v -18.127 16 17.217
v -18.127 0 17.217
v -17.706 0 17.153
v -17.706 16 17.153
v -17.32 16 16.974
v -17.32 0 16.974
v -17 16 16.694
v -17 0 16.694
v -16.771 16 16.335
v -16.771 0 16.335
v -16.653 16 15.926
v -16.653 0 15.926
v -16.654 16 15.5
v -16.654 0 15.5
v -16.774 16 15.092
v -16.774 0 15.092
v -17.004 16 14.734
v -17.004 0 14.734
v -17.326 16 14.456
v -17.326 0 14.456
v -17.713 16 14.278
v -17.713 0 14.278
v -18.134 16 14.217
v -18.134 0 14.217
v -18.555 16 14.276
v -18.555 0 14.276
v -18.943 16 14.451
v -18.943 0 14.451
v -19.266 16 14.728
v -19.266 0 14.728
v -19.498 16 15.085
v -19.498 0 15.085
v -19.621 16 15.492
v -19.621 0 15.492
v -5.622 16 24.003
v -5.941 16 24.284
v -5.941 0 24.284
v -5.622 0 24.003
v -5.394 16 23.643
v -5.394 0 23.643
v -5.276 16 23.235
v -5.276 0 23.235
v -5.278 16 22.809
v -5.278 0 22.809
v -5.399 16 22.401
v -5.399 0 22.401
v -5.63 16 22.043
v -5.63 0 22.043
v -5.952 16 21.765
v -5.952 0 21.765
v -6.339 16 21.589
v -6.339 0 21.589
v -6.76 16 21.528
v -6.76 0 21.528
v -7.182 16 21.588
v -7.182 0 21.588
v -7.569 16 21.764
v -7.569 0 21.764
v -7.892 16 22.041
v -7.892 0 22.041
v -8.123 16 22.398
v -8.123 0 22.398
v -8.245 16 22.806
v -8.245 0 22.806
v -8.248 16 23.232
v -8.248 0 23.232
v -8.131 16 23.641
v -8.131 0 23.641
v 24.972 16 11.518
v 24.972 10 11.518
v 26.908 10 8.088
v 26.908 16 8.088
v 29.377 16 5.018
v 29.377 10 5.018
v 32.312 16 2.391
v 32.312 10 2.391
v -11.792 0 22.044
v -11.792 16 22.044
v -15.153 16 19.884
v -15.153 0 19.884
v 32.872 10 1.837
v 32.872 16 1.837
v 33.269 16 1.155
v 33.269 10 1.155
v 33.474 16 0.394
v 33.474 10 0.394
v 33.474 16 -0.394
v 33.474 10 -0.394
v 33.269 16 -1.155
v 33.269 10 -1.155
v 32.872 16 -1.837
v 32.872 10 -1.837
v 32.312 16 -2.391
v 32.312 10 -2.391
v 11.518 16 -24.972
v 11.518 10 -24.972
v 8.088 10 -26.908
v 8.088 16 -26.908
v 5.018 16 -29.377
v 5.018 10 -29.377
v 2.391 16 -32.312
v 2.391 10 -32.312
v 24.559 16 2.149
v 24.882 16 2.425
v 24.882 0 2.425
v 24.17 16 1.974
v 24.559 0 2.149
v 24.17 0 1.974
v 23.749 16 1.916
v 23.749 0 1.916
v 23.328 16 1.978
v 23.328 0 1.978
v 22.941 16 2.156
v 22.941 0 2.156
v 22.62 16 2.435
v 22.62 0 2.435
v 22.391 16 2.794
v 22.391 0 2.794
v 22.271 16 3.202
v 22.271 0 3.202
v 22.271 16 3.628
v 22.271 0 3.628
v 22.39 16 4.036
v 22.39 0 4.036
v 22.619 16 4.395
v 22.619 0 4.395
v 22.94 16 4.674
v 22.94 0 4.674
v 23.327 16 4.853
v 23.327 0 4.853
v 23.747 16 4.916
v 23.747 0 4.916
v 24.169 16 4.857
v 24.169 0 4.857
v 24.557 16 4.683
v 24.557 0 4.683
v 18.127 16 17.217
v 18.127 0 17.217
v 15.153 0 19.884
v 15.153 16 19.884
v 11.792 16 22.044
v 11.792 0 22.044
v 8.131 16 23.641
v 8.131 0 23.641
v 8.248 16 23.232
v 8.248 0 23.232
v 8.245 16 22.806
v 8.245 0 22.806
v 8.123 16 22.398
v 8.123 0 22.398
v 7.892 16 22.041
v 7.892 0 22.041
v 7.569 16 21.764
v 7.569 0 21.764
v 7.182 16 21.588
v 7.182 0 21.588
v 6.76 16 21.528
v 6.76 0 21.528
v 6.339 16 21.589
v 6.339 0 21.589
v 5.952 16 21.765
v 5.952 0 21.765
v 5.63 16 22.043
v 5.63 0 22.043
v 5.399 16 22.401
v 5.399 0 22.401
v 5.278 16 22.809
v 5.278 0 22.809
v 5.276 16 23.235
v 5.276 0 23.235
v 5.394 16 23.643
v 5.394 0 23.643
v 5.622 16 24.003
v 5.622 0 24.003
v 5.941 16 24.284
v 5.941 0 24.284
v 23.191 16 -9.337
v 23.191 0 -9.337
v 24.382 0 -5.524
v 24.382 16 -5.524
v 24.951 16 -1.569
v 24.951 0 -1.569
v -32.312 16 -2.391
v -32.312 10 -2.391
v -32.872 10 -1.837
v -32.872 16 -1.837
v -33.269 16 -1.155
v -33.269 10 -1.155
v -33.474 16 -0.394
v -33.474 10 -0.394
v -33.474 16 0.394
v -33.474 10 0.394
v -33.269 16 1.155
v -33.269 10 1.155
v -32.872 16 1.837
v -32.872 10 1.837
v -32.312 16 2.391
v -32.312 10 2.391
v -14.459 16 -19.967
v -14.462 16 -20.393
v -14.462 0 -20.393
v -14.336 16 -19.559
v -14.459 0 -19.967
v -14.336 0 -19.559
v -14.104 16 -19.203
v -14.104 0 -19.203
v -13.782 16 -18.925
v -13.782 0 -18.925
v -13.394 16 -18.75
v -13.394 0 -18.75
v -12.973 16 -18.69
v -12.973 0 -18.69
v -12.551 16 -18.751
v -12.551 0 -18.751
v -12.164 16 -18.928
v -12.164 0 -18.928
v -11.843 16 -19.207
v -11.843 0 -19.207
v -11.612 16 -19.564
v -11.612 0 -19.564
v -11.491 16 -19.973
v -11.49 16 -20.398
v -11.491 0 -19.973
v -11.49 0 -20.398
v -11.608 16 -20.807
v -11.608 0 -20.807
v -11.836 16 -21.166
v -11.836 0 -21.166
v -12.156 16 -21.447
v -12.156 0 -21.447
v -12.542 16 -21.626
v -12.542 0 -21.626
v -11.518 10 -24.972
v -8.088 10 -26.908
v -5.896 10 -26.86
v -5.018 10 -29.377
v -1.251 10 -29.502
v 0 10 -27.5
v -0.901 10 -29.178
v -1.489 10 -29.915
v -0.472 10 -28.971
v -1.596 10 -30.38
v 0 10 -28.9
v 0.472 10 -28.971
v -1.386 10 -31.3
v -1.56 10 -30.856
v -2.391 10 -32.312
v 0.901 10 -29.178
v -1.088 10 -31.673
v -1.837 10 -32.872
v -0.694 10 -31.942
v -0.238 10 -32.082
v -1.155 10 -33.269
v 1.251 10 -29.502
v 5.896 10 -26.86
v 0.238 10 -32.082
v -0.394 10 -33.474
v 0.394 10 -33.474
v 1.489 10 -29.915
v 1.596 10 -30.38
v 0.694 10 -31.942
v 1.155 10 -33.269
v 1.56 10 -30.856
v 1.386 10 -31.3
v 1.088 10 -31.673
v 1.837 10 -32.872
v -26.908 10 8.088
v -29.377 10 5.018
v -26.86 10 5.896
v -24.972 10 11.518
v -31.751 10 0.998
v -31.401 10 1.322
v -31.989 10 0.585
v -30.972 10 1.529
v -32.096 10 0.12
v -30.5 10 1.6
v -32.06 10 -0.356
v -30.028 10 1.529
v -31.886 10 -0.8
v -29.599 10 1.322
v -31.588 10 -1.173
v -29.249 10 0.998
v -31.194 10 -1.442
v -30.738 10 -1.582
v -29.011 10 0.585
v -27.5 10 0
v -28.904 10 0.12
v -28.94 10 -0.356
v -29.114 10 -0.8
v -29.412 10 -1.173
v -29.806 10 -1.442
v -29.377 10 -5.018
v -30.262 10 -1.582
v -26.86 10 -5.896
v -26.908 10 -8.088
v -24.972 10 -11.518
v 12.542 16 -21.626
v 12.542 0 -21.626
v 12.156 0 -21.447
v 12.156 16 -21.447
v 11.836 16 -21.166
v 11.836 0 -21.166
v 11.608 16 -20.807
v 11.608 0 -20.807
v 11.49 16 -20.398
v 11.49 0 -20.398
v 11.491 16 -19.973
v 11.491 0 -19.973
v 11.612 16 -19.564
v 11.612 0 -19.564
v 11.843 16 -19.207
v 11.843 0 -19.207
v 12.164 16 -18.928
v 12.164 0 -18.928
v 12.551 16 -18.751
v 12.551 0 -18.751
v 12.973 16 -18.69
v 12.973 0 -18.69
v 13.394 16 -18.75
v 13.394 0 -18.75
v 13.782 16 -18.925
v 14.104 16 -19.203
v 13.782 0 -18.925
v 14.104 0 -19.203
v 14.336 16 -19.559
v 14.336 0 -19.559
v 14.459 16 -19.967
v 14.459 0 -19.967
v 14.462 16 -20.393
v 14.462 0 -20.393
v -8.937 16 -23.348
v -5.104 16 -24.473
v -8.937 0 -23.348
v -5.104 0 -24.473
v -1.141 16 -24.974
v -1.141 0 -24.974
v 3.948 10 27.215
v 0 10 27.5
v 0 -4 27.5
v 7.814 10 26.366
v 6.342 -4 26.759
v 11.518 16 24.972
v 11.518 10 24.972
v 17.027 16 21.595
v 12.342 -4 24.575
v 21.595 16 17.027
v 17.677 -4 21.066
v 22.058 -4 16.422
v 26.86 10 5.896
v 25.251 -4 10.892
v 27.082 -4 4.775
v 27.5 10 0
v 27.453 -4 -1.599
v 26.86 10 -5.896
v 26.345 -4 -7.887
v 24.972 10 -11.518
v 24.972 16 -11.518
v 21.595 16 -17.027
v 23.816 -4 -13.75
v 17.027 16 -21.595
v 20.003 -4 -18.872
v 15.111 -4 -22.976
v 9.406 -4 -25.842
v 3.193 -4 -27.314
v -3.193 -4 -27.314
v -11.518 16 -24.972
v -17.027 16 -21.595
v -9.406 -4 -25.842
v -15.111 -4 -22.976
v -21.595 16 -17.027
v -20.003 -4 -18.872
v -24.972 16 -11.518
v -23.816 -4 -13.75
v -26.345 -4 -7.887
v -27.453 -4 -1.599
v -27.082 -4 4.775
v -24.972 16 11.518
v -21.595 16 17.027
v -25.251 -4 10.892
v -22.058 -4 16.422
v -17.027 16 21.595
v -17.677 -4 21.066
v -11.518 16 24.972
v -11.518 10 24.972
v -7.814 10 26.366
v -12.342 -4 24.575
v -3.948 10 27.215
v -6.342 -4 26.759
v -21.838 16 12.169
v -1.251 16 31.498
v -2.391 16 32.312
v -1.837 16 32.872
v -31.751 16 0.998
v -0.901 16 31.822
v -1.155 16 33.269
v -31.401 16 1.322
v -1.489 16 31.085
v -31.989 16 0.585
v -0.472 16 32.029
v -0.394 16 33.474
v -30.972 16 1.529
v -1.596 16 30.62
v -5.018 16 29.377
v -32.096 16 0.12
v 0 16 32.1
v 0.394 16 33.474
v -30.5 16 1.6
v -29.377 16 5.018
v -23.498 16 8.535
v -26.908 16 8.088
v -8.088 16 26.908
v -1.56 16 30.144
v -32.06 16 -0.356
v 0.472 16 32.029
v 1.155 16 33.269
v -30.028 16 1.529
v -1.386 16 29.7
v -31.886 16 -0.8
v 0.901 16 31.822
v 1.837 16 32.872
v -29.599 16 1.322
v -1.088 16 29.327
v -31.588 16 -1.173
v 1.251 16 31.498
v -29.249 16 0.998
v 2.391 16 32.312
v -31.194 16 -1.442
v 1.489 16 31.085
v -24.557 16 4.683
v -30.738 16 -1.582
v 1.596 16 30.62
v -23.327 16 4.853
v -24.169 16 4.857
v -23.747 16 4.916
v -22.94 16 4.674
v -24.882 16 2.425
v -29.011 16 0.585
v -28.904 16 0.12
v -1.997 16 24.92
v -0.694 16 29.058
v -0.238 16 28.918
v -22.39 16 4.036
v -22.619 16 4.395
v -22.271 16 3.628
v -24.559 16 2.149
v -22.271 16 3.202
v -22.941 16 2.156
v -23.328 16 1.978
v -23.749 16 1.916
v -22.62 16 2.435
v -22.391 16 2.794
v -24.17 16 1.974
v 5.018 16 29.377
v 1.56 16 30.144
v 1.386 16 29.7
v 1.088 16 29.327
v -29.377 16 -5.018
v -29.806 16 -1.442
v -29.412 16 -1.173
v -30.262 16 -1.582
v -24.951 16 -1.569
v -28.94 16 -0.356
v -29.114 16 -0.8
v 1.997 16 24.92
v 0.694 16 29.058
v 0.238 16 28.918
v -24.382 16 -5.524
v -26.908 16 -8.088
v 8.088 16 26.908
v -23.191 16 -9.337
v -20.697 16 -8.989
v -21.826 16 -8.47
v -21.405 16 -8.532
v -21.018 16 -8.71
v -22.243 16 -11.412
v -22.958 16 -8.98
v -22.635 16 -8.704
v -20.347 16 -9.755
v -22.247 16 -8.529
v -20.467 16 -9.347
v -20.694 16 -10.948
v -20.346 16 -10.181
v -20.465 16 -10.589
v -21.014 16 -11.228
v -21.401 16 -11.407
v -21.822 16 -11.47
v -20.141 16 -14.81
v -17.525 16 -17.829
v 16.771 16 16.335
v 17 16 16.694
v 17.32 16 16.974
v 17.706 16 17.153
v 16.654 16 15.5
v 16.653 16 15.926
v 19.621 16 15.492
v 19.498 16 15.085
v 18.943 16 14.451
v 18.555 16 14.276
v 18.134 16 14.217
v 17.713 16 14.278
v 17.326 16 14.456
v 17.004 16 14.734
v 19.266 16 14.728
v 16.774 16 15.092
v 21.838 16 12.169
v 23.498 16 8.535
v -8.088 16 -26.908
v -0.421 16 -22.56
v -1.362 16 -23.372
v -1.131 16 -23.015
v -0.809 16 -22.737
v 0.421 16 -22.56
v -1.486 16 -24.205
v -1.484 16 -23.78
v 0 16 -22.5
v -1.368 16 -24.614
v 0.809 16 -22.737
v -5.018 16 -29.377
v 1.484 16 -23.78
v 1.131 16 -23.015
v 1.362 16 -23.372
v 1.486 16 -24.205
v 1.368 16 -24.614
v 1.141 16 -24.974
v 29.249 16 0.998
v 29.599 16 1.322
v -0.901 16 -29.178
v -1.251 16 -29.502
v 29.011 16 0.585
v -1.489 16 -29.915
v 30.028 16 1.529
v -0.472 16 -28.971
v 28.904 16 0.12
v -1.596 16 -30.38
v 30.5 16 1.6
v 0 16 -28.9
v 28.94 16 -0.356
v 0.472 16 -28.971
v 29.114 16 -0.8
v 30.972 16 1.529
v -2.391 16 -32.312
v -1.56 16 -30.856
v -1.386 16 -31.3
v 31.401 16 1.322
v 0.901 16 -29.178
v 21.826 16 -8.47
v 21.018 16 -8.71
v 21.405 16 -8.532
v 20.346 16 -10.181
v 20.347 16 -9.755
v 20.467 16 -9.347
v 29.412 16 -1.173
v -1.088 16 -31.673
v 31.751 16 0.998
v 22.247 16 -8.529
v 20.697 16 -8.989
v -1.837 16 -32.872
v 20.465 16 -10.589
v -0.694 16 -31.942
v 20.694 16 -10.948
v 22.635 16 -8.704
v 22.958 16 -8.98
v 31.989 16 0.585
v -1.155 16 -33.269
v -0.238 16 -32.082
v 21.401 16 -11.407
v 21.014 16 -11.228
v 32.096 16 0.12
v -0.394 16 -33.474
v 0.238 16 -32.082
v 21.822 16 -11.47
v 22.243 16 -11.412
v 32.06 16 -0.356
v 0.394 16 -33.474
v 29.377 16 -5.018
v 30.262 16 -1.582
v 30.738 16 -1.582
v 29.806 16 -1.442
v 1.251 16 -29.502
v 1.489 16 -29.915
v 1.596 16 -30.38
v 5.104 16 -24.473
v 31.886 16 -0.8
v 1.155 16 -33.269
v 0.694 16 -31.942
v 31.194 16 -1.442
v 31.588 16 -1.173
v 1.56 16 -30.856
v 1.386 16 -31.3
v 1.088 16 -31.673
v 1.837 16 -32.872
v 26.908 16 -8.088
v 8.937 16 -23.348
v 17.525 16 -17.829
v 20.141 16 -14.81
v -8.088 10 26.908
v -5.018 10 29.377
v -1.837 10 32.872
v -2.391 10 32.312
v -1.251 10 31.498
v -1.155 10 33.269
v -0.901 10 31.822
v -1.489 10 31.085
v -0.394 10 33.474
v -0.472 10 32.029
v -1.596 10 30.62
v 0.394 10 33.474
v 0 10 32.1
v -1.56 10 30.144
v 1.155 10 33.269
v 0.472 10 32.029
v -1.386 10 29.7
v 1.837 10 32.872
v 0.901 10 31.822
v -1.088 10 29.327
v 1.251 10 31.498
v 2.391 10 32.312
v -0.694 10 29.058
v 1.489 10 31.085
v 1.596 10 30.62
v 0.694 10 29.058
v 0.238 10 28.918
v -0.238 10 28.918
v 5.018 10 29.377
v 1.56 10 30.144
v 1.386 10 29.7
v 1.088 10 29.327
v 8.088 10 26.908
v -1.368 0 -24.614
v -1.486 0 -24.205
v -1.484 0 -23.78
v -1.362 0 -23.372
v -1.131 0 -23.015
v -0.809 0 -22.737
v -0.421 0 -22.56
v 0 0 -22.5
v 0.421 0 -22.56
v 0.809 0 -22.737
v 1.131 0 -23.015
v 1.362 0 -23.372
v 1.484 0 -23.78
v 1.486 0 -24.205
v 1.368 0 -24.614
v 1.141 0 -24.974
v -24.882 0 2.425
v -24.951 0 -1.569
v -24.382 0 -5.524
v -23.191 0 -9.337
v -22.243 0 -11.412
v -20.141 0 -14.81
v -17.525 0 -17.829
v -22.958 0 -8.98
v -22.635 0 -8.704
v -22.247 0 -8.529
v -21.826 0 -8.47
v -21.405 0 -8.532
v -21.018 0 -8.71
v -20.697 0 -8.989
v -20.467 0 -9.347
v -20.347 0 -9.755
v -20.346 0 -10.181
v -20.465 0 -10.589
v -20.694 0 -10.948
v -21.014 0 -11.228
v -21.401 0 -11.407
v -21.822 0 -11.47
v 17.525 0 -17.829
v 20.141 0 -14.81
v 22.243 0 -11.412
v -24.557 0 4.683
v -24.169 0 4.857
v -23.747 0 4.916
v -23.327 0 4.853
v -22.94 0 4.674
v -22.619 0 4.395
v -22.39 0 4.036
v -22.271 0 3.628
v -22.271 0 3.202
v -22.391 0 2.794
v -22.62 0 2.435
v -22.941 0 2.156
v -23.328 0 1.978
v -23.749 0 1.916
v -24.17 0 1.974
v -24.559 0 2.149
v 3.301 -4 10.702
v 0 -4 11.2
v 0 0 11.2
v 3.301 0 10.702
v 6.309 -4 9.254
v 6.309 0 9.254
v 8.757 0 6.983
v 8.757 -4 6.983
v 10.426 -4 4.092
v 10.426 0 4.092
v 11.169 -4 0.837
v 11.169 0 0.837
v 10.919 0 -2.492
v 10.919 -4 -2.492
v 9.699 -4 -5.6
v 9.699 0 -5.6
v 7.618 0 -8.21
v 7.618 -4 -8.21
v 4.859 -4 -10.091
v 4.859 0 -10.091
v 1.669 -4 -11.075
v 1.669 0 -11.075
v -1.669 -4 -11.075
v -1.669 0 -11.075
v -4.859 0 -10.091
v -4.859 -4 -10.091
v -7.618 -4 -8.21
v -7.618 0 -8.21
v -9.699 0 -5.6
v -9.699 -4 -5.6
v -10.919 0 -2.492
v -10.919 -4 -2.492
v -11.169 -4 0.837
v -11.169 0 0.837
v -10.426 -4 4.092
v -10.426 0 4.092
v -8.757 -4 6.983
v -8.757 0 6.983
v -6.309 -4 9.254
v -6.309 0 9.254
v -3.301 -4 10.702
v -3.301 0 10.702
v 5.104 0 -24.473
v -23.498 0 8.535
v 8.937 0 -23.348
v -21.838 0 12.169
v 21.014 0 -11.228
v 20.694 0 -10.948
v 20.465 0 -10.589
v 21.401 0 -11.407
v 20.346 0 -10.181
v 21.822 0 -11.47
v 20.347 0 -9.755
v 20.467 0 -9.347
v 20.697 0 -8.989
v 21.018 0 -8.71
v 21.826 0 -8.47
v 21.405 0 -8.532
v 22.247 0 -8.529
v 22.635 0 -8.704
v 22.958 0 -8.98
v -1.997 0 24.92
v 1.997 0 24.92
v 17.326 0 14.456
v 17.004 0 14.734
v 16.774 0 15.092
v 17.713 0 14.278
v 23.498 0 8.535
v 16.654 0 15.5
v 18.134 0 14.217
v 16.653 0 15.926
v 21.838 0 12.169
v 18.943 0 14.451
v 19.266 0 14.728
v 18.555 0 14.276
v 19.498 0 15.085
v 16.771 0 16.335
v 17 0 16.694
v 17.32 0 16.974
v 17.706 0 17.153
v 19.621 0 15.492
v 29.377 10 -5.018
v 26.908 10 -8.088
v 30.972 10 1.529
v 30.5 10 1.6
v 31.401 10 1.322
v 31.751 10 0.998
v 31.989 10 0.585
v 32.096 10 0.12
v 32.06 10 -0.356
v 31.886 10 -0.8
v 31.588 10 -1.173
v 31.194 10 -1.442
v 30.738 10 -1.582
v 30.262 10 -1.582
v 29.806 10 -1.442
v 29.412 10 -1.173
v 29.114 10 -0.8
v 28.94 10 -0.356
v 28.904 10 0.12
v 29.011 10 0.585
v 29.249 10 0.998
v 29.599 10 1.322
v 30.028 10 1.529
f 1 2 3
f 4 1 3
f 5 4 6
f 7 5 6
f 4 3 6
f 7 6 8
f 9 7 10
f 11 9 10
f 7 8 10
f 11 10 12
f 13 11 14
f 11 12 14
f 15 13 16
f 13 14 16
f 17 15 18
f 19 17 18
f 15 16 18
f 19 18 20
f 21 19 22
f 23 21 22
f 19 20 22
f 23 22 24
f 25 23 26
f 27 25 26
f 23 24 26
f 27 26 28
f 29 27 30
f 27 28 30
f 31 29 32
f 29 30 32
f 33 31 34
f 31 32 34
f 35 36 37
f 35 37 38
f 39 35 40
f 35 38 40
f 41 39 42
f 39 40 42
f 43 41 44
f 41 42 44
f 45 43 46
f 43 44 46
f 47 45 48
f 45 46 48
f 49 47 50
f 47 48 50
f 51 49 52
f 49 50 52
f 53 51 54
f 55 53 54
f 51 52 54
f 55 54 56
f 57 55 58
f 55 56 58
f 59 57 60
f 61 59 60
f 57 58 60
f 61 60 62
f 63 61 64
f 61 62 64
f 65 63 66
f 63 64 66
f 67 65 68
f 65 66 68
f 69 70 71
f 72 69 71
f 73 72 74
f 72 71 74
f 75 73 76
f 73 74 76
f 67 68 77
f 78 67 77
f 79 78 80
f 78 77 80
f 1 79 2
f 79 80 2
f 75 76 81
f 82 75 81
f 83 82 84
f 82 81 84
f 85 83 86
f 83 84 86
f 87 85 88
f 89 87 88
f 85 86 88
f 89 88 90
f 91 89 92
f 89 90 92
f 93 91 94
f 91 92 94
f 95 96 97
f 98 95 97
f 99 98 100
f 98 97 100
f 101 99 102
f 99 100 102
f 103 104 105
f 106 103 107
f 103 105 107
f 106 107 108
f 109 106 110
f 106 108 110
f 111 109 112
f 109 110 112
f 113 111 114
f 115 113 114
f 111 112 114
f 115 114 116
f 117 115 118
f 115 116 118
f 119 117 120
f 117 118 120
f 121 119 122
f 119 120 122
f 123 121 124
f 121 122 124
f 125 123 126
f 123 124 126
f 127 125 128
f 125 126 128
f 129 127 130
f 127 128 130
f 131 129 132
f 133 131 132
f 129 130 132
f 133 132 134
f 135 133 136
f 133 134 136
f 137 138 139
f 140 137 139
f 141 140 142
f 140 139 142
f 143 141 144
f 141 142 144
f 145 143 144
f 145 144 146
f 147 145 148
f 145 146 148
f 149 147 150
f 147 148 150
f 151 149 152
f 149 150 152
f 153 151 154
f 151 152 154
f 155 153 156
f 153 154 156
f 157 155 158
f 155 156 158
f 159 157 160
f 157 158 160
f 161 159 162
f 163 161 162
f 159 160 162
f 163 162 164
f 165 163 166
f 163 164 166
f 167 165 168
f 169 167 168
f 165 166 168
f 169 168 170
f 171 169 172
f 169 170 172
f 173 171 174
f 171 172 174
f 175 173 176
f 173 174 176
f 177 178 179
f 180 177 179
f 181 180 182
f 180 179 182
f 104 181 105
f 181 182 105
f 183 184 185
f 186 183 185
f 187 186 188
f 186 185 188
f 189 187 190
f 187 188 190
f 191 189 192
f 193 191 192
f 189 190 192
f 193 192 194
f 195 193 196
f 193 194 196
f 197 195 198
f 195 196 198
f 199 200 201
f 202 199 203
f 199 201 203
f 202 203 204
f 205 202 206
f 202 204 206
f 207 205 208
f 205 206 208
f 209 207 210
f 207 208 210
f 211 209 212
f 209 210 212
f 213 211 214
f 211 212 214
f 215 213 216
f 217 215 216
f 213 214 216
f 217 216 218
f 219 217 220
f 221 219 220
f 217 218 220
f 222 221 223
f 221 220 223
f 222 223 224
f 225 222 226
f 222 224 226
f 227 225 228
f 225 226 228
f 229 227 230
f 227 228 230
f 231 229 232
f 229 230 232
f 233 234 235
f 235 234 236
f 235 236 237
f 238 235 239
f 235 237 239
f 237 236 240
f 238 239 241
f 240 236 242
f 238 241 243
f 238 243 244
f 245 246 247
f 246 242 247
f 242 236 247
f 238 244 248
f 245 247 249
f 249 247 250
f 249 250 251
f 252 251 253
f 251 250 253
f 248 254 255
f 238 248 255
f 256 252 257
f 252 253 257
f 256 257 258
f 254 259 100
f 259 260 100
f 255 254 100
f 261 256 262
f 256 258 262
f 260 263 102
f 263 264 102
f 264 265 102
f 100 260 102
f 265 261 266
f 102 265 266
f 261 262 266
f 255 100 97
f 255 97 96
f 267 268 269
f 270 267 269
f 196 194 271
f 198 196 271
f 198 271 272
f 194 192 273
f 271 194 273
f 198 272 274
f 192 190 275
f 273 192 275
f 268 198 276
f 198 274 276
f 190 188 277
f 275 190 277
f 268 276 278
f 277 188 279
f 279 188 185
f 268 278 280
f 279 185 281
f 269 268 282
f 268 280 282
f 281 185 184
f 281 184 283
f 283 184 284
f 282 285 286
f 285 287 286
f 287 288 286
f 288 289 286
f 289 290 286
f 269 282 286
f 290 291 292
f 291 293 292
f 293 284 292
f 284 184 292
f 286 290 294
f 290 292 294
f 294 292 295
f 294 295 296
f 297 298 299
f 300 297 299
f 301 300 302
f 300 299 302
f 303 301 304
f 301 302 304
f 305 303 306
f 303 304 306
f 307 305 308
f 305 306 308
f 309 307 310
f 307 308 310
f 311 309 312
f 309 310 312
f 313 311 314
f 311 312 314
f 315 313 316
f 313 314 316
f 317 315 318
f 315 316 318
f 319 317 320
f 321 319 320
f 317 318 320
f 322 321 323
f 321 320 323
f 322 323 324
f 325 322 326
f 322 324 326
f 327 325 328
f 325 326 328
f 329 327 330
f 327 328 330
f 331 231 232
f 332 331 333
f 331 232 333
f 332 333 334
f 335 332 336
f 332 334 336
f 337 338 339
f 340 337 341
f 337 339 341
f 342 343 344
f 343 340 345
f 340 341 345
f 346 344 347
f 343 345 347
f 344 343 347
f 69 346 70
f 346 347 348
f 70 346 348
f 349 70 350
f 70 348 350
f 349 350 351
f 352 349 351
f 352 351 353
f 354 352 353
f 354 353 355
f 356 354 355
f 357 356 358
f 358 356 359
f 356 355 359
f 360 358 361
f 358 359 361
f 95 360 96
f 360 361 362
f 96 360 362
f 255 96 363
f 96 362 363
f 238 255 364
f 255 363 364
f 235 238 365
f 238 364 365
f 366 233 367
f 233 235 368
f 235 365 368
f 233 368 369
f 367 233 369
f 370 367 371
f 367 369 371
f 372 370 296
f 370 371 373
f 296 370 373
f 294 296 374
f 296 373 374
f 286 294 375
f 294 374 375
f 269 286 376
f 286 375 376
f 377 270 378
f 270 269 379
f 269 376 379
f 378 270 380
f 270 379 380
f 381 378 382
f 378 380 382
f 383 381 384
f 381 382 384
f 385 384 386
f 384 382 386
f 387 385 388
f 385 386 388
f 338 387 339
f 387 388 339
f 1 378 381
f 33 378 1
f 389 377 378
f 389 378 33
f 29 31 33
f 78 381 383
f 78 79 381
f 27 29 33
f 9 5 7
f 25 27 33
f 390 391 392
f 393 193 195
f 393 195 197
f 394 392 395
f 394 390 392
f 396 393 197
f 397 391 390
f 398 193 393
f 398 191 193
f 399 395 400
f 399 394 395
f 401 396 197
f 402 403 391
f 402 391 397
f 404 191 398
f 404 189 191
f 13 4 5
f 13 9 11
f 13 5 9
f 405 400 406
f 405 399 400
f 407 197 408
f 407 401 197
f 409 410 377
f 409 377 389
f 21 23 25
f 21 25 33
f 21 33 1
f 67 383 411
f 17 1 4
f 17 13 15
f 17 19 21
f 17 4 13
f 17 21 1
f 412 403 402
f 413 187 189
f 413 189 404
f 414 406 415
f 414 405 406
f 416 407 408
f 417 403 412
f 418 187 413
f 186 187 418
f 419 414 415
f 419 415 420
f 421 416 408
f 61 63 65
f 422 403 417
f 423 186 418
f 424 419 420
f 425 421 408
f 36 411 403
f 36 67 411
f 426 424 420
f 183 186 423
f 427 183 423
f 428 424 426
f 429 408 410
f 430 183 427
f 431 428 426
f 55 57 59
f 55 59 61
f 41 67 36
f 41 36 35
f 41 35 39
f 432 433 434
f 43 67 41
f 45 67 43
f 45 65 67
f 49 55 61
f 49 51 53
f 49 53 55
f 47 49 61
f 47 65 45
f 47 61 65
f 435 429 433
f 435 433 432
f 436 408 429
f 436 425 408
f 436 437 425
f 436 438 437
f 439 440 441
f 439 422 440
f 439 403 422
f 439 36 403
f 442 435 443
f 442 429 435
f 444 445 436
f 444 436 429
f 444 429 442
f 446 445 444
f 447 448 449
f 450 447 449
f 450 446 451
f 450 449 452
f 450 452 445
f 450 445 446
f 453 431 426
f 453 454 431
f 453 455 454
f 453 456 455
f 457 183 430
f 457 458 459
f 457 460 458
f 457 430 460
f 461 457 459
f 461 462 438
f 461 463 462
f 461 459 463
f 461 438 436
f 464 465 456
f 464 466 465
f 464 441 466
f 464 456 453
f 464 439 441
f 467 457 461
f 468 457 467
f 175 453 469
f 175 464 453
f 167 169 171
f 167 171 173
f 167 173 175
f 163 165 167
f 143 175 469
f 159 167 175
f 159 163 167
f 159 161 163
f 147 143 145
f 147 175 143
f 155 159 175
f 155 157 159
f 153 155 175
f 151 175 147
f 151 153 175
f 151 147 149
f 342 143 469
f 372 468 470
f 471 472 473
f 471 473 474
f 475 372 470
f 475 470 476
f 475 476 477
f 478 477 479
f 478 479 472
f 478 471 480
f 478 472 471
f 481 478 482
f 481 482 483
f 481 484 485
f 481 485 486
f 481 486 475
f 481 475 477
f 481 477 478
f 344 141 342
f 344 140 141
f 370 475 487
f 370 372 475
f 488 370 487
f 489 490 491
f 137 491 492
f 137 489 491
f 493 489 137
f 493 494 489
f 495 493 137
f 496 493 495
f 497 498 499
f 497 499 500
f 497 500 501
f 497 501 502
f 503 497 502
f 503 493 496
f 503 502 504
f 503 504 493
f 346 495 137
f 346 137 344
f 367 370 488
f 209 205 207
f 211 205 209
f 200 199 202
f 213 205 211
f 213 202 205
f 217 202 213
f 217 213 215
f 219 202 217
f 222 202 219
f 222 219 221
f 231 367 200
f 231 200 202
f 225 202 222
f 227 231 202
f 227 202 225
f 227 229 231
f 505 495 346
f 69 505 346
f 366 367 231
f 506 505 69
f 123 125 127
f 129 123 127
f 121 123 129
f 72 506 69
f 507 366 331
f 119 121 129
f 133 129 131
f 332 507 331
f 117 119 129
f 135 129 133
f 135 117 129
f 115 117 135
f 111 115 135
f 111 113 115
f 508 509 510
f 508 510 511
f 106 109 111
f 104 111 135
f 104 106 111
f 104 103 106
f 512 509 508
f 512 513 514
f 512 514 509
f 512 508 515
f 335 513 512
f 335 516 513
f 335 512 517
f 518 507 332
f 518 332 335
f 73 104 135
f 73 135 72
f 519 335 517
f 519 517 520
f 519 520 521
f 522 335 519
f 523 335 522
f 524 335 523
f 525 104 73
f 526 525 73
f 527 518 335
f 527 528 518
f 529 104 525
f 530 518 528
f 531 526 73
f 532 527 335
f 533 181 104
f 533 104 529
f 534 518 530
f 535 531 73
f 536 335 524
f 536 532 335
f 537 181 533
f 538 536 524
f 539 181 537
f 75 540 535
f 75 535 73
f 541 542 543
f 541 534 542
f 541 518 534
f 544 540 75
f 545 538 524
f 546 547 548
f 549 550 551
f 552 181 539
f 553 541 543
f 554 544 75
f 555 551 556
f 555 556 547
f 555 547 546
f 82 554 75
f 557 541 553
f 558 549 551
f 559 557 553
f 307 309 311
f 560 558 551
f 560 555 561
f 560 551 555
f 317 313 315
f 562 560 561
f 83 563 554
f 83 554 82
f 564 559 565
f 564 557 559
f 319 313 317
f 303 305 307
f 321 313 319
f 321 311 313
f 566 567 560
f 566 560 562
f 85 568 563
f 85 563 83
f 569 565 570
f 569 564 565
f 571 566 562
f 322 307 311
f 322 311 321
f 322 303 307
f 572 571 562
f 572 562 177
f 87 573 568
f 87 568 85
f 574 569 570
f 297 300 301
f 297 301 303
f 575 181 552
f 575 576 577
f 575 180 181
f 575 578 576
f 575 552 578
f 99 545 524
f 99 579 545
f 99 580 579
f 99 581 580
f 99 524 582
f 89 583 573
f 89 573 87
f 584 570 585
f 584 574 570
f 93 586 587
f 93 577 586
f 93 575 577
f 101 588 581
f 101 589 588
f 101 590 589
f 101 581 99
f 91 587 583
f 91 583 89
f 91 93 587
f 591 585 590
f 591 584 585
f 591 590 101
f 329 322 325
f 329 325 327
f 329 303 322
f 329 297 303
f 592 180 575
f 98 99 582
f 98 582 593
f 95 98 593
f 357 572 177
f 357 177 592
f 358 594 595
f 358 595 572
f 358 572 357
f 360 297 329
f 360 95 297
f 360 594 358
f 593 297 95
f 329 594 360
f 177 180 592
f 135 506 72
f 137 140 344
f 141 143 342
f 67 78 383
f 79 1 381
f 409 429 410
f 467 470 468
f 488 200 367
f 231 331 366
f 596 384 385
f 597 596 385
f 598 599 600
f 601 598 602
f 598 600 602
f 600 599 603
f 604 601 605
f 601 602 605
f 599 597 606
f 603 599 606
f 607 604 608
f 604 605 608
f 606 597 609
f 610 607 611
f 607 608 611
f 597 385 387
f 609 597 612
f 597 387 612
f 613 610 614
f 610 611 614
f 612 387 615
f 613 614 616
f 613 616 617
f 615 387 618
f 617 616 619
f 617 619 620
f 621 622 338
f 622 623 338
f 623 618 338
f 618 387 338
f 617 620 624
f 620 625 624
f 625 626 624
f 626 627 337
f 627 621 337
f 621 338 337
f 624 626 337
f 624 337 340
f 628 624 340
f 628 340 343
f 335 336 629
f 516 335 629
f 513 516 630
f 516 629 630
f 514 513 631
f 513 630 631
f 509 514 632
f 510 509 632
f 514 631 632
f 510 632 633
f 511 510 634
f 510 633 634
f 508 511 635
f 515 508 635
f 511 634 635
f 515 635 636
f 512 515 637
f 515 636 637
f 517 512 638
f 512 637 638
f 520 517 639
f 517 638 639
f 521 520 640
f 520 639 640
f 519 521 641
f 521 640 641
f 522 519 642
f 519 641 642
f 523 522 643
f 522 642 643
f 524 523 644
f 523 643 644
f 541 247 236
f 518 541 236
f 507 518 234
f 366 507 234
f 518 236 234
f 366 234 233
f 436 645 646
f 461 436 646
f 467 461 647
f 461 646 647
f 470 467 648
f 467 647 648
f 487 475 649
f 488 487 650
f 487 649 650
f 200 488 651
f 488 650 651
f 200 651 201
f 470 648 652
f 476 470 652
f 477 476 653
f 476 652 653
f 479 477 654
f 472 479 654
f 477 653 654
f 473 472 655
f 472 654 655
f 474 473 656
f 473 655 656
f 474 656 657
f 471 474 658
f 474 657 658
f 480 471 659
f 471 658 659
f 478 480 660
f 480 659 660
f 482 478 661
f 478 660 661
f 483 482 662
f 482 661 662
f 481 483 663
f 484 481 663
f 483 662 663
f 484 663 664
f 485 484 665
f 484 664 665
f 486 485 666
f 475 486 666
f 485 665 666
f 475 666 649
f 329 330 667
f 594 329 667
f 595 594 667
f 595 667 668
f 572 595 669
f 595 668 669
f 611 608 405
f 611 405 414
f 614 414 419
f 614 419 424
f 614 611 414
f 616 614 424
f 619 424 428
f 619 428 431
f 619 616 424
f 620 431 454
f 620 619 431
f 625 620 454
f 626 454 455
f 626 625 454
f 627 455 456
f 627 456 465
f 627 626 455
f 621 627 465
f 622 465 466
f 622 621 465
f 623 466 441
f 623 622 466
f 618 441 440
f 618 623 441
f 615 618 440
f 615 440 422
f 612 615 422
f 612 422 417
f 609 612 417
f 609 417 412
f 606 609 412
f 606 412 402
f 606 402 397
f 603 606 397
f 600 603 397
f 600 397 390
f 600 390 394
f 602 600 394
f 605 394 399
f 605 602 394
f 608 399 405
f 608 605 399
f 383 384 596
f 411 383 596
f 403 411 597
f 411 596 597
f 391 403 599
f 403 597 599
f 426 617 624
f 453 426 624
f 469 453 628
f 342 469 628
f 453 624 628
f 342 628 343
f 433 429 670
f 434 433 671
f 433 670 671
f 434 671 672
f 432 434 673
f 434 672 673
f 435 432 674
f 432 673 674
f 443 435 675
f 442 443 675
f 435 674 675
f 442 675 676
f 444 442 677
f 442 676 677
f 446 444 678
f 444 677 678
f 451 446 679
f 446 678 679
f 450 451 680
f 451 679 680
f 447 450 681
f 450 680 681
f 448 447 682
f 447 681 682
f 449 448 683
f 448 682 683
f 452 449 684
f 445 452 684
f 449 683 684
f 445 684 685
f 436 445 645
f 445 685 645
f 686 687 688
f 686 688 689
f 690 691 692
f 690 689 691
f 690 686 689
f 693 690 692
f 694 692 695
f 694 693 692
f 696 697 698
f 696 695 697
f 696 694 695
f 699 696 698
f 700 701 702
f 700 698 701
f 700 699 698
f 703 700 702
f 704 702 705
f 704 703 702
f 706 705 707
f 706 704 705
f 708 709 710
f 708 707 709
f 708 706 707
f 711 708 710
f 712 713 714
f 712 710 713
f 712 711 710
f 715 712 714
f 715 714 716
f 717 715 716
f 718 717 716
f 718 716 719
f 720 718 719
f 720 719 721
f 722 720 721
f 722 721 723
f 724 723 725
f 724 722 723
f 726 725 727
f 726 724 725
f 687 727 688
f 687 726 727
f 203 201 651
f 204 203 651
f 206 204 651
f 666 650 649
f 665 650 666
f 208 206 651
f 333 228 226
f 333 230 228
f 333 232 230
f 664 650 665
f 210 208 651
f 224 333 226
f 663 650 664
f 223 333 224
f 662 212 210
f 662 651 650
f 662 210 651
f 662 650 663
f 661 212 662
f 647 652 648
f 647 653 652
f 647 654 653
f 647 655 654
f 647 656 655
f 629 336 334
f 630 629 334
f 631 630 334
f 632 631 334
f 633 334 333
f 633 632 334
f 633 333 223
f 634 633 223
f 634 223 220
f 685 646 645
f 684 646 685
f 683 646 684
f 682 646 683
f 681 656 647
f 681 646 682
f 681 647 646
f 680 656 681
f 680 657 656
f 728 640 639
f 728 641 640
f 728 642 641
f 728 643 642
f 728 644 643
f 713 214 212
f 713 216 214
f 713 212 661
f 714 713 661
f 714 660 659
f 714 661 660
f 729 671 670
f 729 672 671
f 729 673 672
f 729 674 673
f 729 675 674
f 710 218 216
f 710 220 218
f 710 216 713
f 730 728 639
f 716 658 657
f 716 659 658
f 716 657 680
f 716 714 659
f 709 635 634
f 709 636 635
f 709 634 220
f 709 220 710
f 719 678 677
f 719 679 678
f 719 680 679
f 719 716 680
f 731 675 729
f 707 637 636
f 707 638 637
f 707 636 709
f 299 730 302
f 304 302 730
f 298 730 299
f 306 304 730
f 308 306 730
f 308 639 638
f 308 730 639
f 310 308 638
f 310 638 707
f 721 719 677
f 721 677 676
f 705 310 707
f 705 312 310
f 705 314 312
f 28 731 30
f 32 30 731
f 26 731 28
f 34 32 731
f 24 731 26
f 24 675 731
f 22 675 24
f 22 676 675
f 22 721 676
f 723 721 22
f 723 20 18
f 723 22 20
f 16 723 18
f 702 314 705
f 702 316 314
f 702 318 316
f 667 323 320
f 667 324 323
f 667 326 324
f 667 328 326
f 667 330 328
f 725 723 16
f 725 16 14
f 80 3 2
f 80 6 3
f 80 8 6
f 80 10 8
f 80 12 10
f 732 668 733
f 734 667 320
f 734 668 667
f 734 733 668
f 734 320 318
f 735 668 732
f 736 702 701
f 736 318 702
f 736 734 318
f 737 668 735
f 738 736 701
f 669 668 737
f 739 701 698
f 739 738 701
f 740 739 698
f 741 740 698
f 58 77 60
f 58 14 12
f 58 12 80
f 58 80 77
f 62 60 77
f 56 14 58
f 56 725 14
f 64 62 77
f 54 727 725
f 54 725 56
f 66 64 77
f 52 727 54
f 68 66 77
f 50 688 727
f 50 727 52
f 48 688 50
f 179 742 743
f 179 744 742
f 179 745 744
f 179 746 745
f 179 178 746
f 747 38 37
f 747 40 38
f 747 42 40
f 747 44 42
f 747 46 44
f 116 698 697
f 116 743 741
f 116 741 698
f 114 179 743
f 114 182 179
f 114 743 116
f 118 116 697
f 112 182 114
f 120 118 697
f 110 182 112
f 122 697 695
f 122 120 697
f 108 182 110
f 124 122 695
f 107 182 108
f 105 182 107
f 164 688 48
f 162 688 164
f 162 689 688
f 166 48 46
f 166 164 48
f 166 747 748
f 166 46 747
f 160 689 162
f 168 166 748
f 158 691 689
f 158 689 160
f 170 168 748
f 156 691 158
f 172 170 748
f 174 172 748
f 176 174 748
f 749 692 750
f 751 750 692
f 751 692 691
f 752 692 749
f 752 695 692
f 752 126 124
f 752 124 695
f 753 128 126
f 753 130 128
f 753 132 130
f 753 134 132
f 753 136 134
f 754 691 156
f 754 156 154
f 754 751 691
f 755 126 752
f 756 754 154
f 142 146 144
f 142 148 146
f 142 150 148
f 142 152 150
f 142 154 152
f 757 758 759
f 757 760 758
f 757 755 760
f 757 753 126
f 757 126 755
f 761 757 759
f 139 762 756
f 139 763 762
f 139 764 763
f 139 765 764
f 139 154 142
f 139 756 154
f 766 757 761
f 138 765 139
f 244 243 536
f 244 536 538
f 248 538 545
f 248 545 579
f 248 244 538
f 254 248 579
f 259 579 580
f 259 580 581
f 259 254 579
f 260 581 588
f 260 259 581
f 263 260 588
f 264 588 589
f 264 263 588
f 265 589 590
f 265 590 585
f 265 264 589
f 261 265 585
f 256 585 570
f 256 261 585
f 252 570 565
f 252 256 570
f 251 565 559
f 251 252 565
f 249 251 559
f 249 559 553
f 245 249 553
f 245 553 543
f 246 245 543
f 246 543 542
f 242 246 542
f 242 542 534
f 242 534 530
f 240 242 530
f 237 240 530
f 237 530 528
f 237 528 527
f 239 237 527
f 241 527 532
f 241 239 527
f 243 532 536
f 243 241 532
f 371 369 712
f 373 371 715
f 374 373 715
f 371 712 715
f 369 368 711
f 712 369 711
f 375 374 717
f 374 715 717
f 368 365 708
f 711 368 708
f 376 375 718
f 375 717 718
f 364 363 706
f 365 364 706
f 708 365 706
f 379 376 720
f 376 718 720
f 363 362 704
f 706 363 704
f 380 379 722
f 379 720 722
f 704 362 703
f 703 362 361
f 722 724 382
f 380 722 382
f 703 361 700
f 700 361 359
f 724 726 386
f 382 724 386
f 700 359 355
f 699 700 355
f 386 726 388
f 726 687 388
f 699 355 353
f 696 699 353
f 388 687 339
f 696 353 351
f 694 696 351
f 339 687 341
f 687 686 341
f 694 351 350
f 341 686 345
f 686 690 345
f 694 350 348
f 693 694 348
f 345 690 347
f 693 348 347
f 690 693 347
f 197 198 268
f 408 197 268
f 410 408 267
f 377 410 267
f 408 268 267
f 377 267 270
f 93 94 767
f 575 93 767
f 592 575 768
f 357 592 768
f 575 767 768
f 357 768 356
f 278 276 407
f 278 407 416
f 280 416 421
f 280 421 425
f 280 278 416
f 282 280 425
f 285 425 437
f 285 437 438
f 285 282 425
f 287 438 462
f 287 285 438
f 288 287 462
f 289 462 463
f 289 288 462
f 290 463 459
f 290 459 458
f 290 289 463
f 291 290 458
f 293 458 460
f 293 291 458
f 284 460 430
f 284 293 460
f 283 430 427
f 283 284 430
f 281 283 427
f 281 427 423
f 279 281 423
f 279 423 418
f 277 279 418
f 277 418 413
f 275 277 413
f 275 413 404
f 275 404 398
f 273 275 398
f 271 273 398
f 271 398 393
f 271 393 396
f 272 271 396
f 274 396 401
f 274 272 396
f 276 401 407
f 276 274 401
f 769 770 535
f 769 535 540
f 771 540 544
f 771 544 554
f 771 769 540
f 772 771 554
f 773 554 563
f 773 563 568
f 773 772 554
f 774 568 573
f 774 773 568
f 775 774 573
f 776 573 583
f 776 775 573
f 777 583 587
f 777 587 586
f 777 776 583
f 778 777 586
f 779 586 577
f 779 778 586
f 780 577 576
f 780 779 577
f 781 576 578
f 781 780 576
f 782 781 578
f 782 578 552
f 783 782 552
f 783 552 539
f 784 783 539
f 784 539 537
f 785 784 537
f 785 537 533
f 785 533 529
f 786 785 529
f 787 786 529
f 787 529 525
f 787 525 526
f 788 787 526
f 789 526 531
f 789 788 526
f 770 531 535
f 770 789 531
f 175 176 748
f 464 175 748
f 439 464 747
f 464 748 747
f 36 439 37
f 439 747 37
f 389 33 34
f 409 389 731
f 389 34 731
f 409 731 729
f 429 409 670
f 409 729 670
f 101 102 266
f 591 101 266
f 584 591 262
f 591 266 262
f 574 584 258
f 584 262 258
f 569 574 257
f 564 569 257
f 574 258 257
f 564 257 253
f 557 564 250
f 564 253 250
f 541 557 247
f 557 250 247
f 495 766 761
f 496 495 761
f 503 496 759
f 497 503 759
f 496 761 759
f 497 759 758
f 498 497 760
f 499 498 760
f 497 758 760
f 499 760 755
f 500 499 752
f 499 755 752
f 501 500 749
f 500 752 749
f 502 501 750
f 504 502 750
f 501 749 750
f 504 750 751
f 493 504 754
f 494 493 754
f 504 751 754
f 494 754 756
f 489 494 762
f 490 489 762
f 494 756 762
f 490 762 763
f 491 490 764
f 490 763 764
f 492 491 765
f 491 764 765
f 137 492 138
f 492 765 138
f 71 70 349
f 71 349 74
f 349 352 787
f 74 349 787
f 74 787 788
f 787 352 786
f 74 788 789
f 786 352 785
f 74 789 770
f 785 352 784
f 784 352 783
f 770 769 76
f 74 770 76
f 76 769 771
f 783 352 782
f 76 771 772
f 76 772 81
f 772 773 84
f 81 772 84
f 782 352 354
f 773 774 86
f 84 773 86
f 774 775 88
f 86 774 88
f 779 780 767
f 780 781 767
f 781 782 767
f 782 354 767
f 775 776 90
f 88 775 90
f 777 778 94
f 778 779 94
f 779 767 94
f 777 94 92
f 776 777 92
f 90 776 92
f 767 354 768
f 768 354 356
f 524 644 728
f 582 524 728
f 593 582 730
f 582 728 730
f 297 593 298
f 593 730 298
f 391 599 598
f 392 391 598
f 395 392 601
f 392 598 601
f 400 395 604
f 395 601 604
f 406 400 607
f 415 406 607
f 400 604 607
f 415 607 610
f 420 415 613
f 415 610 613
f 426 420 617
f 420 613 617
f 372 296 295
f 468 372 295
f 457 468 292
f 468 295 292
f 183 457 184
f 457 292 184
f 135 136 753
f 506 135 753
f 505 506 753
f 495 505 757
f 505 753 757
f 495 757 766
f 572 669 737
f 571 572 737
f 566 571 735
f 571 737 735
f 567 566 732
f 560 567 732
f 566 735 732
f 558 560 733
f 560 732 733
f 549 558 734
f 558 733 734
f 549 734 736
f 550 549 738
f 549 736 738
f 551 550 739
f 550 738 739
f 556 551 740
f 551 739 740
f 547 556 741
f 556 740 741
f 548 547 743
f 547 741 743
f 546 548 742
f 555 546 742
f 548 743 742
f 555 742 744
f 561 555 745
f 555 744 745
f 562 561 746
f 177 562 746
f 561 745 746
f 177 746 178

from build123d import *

# Parameters (mm, degrees)
SKETCH1_R               = 27.5
BOSS_EXTRUDE1_DEPTH     = 16
BOSS_EXTRUDE2_START     = -4
SKETCH1_3_R             = 27.5
BOSS_EXTRUDE2_DEPTH     = 4
CUT_EXTRUDE1_DEPTH      = 43.053537307
CUT_EXTRUDE1_DEPTH_BACK = 43.053537307
SKETCH1_5_R             = 11.2
SKETCH6_R               = 3
SKETCH6_R_2             = 1.6
BOSS_EXTRUDE6_DEPTH     = 6
BOSS_EXTRUDE6_2_DEPTH   = 6
BOSS_EXTRUDE6_3_DEPTH   = 6
BOSS_EXTRUDE6_4_DEPTH   = 6
BOSS_EXTRUDE8_START     = -6
SKETCH8_R               = 1.6
BOSS_EXTRUDE8_DEPTH     = 6


with BuildPart() as part:
    # Sketch1 → Boss-Extrude1 (new body)
    with BuildSketch(Plane(origin=(0, 0, 0), x_dir=(1, 0, 0), z_dir=(0, 1, 0))):
        with Locations(Location((0, 0, 0), (0, 0, 270))):
            Circle(SKETCH1_R)
        with BuildLine():
            ThreePointArc((1.140791464, 24.973958333), (7.043313921, 23.98732434), (12.542246399, 21.626189106))
            ThreePointArc((12.542246399, 21.626189106), (12.164418393, 18.928204489), (14.461636098, 20.392672247))
            ThreePointArc((14.461636098, 20.392672247), (18.893739359, 16.371518349), (22.24320965, 11.412257642))
            ThreePointArc((22.24320965, 11.412257642), (20.466719895, 9.346837793), (23.191013452, 9.33685681))
            ThreePointArc((23.191013452, 9.33685681), (24.745536047, 3.557870957), (24.882111, -2.424984989))
            ThreePointArc((24.882111, -2.424984989), (22.270982442, -3.202083861), (24.557407894, -4.683344693))
            ThreePointArc((24.557407894, -4.683344693), (22.740799884, -10.385375325), (19.621117916, -15.49231202))
            ThreePointArc((19.621117916, -15.49231202), (17.004365423, -14.734366514), (18.126998845, -17.216617347))
            ThreePointArc((18.126998845, -17.216617347), (13.516020436, -21.031338321), (8.13055853, -23.640939448))
            ThreePointArc((8.13055853, -23.640939448), (6.338982529, -21.588591906), (5.941395741, -24.28373564))
            ThreePointArc((5.941395741, -24.28373564), (0, -25), (-5.941395741, -24.28373564))
            ThreePointArc((-5.941395741, -24.28373564), (-6.338982529, -21.588591906), (-8.13055853, -23.640939448))
            ThreePointArc((-8.13055853, -23.640939448), (-13.516020436, -21.031338321), (-18.126998845, -17.216617347))
            ThreePointArc((-18.126998845, -17.216617347), (-17.004365423, -14.734366514), (-19.621117916, -15.49231202))
            ThreePointArc((-19.621117916, -15.49231202), (-22.740799884, -10.385375325), (-24.557407894, -4.683344693))
            ThreePointArc((-24.557407894, -4.683344693), (-22.270982442, -3.202083861), (-24.882111, -2.424984989))
            ThreePointArc((-24.882111, -2.424984989), (-24.745536047, 3.557870957), (-23.191013452, 9.33685681))
            ThreePointArc((-23.191013452, 9.33685681), (-20.466719895, 9.346837793), (-22.24320965, 11.412257642))
            ThreePointArc((-22.24320965, 11.412257642), (-18.893739359, 16.371518349), (-14.461636098, 20.392672247))
            ThreePointArc((-14.461636098, 20.392672247), (-12.164418393, 18.928204489), (-12.542246399, 21.626189106))
            ThreePointArc((-12.542246399, 21.626189106), (-7.043313921, 23.98732434), (-1.140791464, 24.973958333))
            ThreePointArc((-1.140791464, 24.973958333), (0, 22.5), (1.140791464, 24.973958333))
        make_face(mode=Mode.SUBTRACT)
    extrude(amount=BOSS_EXTRUDE1_DEPTH)

    # Sketch1<3> → Boss-Extrude2 (add)
    with BuildSketch(Plane(origin=(0, 0, 0), x_dir=(1, 0, 0), z_dir=(0, 1, 0)).offset(BOSS_EXTRUDE2_START)):
        with Locations(Location((0, 0, 0), (0, 0, 270))):
            Circle(SKETCH1_3_R)
    extrude(amount=BOSS_EXTRUDE2_DEPTH)

    # Sketch1<5> → Cut-Extrude1 (cut, two sides: drawn at the far end of the back side and taken through both)
    with BuildSketch(Plane(origin=(0, 0, 0), x_dir=(1, 0, 0), z_dir=(0, 1, 0)).offset(-CUT_EXTRUDE1_DEPTH_BACK)):
        with Locations(Location((0, 0, 0), (0, 0, 270))):
            Circle(SKETCH1_5_R)
    extrude(amount=CUT_EXTRUDE1_DEPTH + CUT_EXTRUDE1_DEPTH_BACK, mode=Mode.SUBTRACT)



with BuildPart() as body_2:
    # Sketch6 → Boss-Extrude6 (new body)
    with BuildSketch(Plane(origin=(0, 10, 0), x_dir=(1, 0, 0), z_dir=(0, 1, 0))):
        with Locations(Location((-30.5, 0, 0), (0, 0, 270))):
            Circle(SKETCH6_R)
        with Locations(Location((-30.5, 0, 0), (0, 0, 270))):
            Circle(SKETCH6_R_2, mode=Mode.SUBTRACT)
    extrude(amount=BOSS_EXTRUDE6_DEPTH)


with BuildPart() as body_3:
    # Sketch6 → Boss-Extrude6 2 (new body)
    with BuildSketch(Plane(origin=(0, 10, 0), x_dir=(1, 0, 0), z_dir=(0, 1, 0))):
        with Locations(Location((0, 30.5, 0), (0, 0, 270))):
            Circle(SKETCH6_R)
        with Locations(Location((0, 30.5, 0), (0, 0, 270))):
            Circle(SKETCH6_R_2, mode=Mode.SUBTRACT)
    extrude(amount=BOSS_EXTRUDE6_2_DEPTH)


with BuildPart() as body_4:
    # Sketch6 → Boss-Extrude6 3 (new body)
    with BuildSketch(Plane(origin=(0, 10, 0), x_dir=(1, 0, 0), z_dir=(0, 1, 0))):
        with Locations(Location((30.5, 0, 0), (0, 0, 270))):
            Circle(SKETCH6_R)
        with Locations(Location((30.5, 0, 0), (0, 0, 270))):
            Circle(SKETCH6_R_2, mode=Mode.SUBTRACT)
    extrude(amount=BOSS_EXTRUDE6_3_DEPTH)


with BuildPart() as body_5:
    # Sketch6 → Boss-Extrude6 4 (new body)
    with BuildSketch(Plane(origin=(0, 10, 0), x_dir=(1, 0, 0), z_dir=(0, 1, 0))):
        with Locations(Location((0, -30.5, 0), (0, 0, 270))):
            Circle(SKETCH6_R)
        with Locations(Location((0, -30.5, 0), (0, 0, 270))):
            Circle(SKETCH6_R_2, mode=Mode.SUBTRACT)
    extrude(amount=BOSS_EXTRUDE6_4_DEPTH)


with BuildPart() as part_1:
    add(part.part)

    add(body_2.part)  # Boss-Extrude8 merges body 2

    add(body_3.part)  # Boss-Extrude8 merges body 3

    add(body_4.part)  # Boss-Extrude8 merges body 4

    add(body_5.part)  # Boss-Extrude8 merges body 5
    # Sketch8 → Boss-Extrude8 (add)
    # profile 1 of 4: a face of its own
    with BuildSketch(Plane(origin=(0, 16, 0), x_dir=(1, 0, 0), z_dir=(0, 1, 0)).offset(BOSS_EXTRUDE8_START)):
        with BuildLine():
            ThreePointArc((-32.31166617, -2.391205906), (-28.079459744, -6.502708785), (-24.971529598, -11.518364013))
            ThreePointArc((-24.971529598, -11.518364013), (-27.5, 0), (-24.971529598, 11.518364013))
            ThreePointArc((-24.971529598, 11.518364013), (-28.079459744, 6.502708785), (-32.31166617, 2.391205906))
            ThreePointArc((-32.31166617, 2.391205906), (-33.5, 0), (-32.31166617, -2.391205906))
        make_face()
        with Locations(Location((-30.5, 0, 0), (0, 0, 270))):
            Circle(SKETCH8_R, mode=Mode.SUBTRACT)
    # profile 2 of 4: a face of its own
    with BuildSketch(Plane(origin=(0, 16, 0), x_dir=(1, 0, 0), z_dir=(0, 1, 0)).offset(BOSS_EXTRUDE8_START)):
        with BuildLine():
            ThreePointArc((-2.391205906, 32.31166617), (-6.502708785, 28.079459744), (-11.518364013, 24.971529598))
            ThreePointArc((-11.518364013, 24.971529598), (0, 27.5), (11.518364013, 24.971529598))
            ThreePointArc((11.518364013, 24.971529598), (6.502708785, 28.079459744), (2.391205906, 32.31166617))
            ThreePointArc((2.391205906, 32.31166617), (0, 33.5), (-2.391205906, 32.31166617))
        make_face()
        with Locations(Location((0, 30.5, 0), (0, 0, 270))):
            Circle(SKETCH8_R, mode=Mode.SUBTRACT)
    # profile 3 of 4: a face of its own
    with BuildSketch(Plane(origin=(0, 16, 0), x_dir=(1, 0, 0), z_dir=(0, 1, 0)).offset(BOSS_EXTRUDE8_START)):
        with BuildLine():
            ThreePointArc((32.31166617, 2.391205906), (28.079459744, 6.502708785), (24.971529598, 11.518364013))
            ThreePointArc((24.971529598, 11.518364013), (27.5, 0), (24.971529598, -11.518364013))
            ThreePointArc((24.971529598, -11.518364013), (28.079459744, -6.502708785), (32.31166617, -2.391205906))
            ThreePointArc((32.31166617, -2.391205906), (33.5, 0), (32.31166617, 2.391205906))
        make_face()
        with Locations(Location((30.5, 0, 0), (0, 0, 270))):
            Circle(SKETCH8_R, mode=Mode.SUBTRACT)
    # profile 4 of 4: a face of its own
    with BuildSketch(Plane(origin=(0, 16, 0), x_dir=(1, 0, 0), z_dir=(0, 1, 0)).offset(BOSS_EXTRUDE8_START)):
        with BuildLine():
            ThreePointArc((2.391205906, -32.31166617), (6.502708785, -28.079459744), (11.518364013, -24.971529598))
            ThreePointArc((11.518364013, -24.971529598), (0, -27.5), (-11.518364013, -24.971529598))
            ThreePointArc((-11.518364013, -24.971529598), (-6.502708785, -28.079459744), (-2.391205906, -32.31166617))
            ThreePointArc((-2.391205906, -32.31166617), (0, -33.5), (2.391205906, -32.31166617))
        make_face()
        with Locations(Location((0, -30.5, 0), (0, 0, 270))):
            Circle(SKETCH8_R, mode=Mode.SUBTRACT)
    extrude(amount=BOSS_EXTRUDE8_DEPTH)


solid = part_1.part
